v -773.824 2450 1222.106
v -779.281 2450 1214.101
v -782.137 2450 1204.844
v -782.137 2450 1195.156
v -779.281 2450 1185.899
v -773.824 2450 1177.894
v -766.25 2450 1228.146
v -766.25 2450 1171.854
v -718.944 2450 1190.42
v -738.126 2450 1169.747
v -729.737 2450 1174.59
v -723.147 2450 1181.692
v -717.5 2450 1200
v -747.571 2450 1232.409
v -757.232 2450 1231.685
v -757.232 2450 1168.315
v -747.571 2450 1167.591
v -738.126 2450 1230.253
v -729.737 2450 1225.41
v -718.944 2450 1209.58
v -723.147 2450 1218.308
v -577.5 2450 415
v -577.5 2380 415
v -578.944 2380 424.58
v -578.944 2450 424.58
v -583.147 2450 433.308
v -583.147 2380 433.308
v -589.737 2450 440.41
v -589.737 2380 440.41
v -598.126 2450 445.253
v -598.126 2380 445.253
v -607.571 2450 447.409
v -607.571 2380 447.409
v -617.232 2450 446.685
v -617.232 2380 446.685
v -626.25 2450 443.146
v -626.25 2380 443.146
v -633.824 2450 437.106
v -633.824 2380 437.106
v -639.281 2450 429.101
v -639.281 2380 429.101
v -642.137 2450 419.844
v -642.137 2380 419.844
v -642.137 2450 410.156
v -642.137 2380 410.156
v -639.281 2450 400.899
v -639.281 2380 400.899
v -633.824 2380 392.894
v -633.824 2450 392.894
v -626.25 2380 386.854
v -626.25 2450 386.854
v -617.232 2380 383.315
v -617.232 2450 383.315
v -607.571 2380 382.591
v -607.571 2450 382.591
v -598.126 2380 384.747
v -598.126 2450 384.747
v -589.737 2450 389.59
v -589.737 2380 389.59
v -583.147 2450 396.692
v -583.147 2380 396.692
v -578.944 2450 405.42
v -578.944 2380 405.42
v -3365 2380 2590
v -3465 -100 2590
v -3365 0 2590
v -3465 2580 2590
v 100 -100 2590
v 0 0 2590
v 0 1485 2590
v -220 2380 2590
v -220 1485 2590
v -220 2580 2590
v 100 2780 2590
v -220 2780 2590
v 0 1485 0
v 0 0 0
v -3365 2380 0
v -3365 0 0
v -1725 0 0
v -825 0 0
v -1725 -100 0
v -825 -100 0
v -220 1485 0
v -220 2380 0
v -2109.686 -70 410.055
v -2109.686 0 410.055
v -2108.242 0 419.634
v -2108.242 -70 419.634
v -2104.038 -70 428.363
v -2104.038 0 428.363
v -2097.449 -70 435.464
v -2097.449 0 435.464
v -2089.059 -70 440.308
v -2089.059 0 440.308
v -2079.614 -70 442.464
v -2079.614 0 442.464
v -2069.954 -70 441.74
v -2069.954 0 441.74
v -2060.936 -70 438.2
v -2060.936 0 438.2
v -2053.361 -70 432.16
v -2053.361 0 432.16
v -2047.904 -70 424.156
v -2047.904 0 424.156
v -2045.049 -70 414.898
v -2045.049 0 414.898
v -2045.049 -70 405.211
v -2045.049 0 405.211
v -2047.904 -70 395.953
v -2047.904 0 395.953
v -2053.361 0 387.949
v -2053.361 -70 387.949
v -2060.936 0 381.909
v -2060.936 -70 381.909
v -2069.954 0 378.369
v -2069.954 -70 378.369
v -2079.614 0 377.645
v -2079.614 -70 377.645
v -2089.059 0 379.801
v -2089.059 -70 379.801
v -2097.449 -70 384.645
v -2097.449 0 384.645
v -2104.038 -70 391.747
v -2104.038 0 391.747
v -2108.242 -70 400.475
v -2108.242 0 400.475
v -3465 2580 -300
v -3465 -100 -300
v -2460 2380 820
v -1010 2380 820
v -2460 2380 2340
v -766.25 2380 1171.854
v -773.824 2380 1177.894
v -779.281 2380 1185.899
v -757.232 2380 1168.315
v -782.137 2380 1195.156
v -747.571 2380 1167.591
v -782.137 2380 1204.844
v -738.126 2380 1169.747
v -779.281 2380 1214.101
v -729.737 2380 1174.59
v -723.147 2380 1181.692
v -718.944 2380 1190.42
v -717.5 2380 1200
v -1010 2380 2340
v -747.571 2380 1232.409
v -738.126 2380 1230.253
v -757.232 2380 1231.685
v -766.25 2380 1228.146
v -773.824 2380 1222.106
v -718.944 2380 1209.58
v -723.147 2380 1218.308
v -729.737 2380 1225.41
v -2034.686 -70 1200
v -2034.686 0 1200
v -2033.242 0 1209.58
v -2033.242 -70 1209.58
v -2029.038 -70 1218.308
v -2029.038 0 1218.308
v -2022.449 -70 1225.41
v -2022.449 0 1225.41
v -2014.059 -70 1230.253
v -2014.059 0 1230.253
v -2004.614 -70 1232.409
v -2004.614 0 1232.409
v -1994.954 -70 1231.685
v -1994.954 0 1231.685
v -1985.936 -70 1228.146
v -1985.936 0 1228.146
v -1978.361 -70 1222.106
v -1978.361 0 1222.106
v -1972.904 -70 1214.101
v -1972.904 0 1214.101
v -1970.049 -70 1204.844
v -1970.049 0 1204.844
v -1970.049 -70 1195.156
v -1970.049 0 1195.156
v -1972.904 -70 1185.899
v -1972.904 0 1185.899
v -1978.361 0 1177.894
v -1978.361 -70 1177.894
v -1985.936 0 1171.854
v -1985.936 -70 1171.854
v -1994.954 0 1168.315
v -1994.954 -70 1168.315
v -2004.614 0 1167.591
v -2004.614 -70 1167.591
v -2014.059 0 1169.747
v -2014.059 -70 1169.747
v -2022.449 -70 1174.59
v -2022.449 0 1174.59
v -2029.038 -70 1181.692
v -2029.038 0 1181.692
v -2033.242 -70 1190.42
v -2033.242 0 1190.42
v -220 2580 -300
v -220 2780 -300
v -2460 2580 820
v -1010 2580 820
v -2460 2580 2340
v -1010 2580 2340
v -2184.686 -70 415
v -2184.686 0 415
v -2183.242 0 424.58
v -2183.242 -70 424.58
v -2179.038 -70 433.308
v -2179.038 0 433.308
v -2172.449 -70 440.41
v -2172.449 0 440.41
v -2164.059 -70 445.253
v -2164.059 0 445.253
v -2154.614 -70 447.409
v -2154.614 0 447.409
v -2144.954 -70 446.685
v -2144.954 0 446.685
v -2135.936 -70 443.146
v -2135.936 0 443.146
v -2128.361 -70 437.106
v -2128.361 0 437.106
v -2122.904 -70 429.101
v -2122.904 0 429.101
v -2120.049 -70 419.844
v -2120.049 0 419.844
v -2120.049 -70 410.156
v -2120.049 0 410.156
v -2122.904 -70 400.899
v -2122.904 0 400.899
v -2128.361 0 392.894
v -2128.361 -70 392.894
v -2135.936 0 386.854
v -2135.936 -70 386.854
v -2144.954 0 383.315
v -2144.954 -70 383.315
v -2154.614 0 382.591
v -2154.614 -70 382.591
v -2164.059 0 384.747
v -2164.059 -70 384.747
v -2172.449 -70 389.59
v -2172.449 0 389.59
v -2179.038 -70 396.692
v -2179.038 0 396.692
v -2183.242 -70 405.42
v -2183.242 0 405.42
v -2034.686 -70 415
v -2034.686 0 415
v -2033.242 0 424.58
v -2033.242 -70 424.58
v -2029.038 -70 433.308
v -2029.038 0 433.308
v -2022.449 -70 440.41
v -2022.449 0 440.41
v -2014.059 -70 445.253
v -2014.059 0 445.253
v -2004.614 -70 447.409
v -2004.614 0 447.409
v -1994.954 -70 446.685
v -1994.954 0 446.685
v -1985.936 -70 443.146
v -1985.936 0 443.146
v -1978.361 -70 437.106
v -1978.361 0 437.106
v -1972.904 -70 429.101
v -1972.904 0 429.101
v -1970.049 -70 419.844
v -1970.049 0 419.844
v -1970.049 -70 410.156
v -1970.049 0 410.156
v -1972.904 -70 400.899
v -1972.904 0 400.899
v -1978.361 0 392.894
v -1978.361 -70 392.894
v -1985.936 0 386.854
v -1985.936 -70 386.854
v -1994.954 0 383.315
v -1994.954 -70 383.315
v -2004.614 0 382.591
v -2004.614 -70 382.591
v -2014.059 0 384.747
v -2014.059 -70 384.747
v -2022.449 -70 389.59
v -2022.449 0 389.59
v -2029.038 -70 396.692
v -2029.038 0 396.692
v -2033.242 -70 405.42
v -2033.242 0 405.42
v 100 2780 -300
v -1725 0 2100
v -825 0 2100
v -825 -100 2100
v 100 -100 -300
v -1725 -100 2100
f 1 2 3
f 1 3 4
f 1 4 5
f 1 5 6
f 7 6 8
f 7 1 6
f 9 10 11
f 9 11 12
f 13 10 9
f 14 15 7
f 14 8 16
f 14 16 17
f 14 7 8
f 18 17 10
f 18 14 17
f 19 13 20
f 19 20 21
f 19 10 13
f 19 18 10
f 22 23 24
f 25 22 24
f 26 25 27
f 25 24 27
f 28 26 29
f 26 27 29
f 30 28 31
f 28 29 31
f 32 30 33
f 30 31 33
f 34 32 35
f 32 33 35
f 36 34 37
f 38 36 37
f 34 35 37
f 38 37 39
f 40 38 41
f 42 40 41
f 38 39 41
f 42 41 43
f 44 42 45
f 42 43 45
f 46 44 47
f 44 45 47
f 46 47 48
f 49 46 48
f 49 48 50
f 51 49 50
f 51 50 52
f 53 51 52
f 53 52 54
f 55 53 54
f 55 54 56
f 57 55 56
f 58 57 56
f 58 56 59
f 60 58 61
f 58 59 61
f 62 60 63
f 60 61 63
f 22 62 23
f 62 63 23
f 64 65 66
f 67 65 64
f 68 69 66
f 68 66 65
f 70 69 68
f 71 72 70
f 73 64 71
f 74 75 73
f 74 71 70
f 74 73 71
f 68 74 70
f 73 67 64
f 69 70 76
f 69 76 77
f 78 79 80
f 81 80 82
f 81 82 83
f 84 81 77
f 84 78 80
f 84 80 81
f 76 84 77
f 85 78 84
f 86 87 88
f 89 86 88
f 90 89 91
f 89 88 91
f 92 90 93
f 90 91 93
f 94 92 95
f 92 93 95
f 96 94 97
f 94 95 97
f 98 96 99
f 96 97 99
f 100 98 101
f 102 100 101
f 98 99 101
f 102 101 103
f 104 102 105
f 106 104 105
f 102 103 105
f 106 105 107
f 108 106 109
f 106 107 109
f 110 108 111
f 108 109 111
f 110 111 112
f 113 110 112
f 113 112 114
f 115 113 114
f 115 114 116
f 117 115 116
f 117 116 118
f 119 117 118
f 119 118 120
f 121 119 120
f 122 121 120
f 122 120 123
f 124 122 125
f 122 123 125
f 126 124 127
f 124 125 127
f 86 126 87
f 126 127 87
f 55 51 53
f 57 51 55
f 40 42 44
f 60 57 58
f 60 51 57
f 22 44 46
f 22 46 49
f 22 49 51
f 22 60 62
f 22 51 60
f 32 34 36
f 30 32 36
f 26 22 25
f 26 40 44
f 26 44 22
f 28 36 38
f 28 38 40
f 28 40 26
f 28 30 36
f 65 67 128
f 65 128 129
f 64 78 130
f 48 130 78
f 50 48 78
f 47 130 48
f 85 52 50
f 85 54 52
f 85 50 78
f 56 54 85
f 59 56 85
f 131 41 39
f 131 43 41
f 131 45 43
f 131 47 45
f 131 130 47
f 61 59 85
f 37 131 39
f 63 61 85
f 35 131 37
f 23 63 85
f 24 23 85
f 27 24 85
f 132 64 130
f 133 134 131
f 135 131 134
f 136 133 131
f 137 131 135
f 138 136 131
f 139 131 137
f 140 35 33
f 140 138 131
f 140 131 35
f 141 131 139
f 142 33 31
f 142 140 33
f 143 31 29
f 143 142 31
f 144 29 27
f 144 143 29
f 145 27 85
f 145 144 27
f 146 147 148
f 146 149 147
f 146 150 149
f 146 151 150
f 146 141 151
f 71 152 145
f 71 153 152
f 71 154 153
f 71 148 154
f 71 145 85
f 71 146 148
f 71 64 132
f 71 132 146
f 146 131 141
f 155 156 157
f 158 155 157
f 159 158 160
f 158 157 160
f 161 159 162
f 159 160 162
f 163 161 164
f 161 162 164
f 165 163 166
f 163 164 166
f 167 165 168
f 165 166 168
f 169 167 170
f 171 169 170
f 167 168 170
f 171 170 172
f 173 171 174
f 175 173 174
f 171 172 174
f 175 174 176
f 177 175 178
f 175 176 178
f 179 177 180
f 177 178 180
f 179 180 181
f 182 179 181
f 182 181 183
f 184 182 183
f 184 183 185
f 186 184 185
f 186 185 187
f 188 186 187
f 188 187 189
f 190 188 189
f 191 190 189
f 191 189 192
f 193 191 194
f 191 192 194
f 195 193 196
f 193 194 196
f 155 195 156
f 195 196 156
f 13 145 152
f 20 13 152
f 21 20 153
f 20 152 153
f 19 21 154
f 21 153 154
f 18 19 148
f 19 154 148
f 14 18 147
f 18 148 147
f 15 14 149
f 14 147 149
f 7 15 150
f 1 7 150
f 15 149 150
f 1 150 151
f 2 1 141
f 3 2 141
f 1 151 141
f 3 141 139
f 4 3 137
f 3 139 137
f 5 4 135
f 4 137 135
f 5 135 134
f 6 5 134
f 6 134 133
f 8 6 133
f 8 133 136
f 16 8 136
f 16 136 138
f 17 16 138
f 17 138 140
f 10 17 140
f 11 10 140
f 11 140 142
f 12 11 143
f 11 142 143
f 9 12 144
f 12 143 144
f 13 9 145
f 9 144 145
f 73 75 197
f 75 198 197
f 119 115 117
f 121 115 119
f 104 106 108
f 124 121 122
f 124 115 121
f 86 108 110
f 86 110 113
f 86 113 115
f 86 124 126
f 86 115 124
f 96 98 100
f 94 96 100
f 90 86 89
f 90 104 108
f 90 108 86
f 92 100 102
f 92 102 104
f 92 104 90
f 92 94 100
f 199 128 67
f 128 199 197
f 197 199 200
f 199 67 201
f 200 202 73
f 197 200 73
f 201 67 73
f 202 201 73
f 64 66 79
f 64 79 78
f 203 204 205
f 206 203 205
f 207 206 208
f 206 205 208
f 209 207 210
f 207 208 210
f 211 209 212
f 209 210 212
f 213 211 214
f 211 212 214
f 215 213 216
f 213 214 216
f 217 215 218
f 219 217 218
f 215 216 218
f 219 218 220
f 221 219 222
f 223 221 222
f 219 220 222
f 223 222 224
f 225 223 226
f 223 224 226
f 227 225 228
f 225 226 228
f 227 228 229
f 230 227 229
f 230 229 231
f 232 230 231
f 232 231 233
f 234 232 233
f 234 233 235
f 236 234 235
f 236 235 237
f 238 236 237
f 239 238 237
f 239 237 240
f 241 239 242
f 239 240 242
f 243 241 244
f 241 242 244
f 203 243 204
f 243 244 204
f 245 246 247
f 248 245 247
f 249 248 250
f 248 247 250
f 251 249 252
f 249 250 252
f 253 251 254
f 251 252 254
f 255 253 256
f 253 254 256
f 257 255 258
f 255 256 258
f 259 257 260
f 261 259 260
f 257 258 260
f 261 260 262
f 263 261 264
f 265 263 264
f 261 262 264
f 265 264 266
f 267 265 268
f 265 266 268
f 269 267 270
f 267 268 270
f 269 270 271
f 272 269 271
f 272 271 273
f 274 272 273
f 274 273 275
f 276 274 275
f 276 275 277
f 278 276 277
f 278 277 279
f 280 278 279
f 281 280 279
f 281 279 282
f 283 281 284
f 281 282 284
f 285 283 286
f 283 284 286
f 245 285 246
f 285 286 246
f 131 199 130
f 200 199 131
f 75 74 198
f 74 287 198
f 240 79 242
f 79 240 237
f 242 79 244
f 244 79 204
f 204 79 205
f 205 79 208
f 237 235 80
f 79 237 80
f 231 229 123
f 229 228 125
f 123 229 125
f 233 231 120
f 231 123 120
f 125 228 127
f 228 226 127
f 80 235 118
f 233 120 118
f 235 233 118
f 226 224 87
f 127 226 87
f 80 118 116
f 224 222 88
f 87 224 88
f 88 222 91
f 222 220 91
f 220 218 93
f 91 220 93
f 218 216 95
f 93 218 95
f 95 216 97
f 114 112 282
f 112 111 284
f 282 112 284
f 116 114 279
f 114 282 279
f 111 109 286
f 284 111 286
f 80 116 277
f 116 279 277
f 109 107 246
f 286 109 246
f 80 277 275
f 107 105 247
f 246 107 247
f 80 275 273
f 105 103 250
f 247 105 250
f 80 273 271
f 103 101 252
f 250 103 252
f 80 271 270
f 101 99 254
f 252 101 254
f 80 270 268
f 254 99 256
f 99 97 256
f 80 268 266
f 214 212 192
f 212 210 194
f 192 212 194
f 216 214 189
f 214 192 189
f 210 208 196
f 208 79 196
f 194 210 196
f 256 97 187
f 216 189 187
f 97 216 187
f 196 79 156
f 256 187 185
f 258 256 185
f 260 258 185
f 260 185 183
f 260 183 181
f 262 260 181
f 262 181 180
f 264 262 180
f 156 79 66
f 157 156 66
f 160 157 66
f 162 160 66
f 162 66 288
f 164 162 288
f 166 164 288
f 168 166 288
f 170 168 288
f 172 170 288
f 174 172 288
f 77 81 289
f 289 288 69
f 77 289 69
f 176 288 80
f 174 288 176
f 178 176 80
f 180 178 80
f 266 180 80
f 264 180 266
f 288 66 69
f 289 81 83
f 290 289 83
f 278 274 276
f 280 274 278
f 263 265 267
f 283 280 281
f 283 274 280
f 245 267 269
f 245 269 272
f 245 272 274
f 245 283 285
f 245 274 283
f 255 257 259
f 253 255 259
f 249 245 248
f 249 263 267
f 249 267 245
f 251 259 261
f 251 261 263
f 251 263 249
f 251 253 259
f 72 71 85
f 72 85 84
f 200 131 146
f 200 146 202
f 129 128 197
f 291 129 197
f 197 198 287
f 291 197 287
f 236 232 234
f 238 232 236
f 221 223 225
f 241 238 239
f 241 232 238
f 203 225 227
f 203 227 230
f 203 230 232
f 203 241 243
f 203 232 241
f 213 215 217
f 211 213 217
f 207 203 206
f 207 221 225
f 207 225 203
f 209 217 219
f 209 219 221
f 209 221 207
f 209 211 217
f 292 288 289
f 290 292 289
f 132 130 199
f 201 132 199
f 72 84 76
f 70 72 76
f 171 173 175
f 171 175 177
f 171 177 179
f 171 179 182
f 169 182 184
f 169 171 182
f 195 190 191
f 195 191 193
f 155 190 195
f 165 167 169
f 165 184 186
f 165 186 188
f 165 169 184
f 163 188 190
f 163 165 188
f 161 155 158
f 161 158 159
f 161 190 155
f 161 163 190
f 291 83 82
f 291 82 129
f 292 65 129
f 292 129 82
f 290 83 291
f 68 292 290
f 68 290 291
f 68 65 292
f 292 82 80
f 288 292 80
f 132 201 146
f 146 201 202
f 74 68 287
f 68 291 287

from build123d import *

# Parameters (mm, degrees)
F0_W      = 1450
F0_H      = 200
F0_W_2    = 790
F0_W_3    = 900
F0_H_2    = 100
F1_DEPTH  = 300
F2_DEPTH  = 2590
F3_DEPTH  = 820
F4_W      = 900
F4_H      = 100
F5_DEPTH  = 490
F6_W      = 1450
F6_H      = 200
F7_DEPTH  = 250
F8_R      = 32.5
F9_DEPTH  = 70
F10_R     = 32.5
F11_DEPTH = 70


with BuildPart() as f1:
    # F0 (on Top) → F1 (new body)
    with BuildSketch(Plane.XY):
        Polygon((-825, 0), (0, 0), (0, 1485), (-220, 1485), (-220, 2380), (-1010, 2380), (-2460, 2380), (-3365, 2380), (-3365, 0), (-1725, 0), align=None)
        Polygon((-1725, -100), (-1725, 0), (-3365, 0), (-3365, 2380), (-2460, 2380), (-2460, 2580), (-3465, 2580), (-3465, -100), align=None)
        with Locations((-1735, 2480)):
            Rectangle(F0_W, F0_H)
        with Locations((-615, 2480)):
            Rectangle(F0_W_2, F0_H)
        with Locations((-1275, -50)):
            Rectangle(F0_W_3, F0_H_2)
        Polygon((0, 1485), (0, 0), (-825, 0), (-825, -100), (100, -100), (100, 1485), align=None)
        Polygon((-220, 1485), (0, 1485), (100, 1485), (100, 2580), (100, 2780), (-220, 2780), (-220, 2580), (-220, 2380), align=None)
    extrude(amount=-F1_DEPTH)

    # F0 (on Top) → F2 (join)
    with BuildSketch(Plane.XY):
        Polygon((-220, 1485), (0, 1485), (100, 1485), (100, 2580), (100, 2780), (-220, 2780), (-220, 2580), (-220, 2380), align=None)
        Polygon((-1725, -100), (-1725, 0), (-3365, 0), (-3365, 2380), (-2460, 2380), (-2460, 2580), (-3465, 2580), (-3465, -100), align=None)
        Polygon((0, 1485), (0, 0), (-825, 0), (-825, -100), (100, -100), (100, 1485), align=None)
        with Locations((-615, 2480)):
            Rectangle(F0_W_2, F0_H)
    extrude(amount=F2_DEPTH)

    # F0 (on Top) → F3 (join)
    with BuildSketch(Plane.XY):
        with Locations((-1735, 2480)):
            Rectangle(F0_W, F0_H)
    extrude(amount=F3_DEPTH)

    # F4 (on face) → F5 (join)
    with BuildSketch(Plane.XY.offset(2590)):
        with Locations((-1275, -50)):
            Rectangle(F4_W, F4_H)
    extrude(amount=-F5_DEPTH)

    # F6 (on face) → F7 (join)
    with BuildSketch(Plane.XY.offset(2590)):
        with Locations((-1735, 2480)):
            Rectangle(F6_W, F6_H)
    extrude(amount=-F7_DEPTH)

    # F8 (on face) → F9 (cut)
    with BuildSketch(Plane.XZ.offset(-2380)):
        with Locations((-750, 1200)):
            Circle(F8_R)
        with Locations((-610, 415)):
            Circle(F8_R)
    extrude(amount=-F9_DEPTH, mode=Mode.SUBTRACT)

    # F10 (on face) → F11 (cut)
    with BuildSketch(Plane(origin=(0, 0, 0), x_dir=(-1, 0, 0), z_dir=(0, 1, 0))):
        with Locations((2002.185583, 415)):
            Circle(F10_R)
        with Locations((2077.185583, 410.054623)):
            Circle(F10_R)
        with Locations((2152.185583, 415)):
            Circle(F10_R)
        with Locations((2002.185583, 1200)):
            Circle(F10_R)
    extrude(amount=-F11_DEPTH, mode=Mode.SUBTRACT)


solid = f1.part
